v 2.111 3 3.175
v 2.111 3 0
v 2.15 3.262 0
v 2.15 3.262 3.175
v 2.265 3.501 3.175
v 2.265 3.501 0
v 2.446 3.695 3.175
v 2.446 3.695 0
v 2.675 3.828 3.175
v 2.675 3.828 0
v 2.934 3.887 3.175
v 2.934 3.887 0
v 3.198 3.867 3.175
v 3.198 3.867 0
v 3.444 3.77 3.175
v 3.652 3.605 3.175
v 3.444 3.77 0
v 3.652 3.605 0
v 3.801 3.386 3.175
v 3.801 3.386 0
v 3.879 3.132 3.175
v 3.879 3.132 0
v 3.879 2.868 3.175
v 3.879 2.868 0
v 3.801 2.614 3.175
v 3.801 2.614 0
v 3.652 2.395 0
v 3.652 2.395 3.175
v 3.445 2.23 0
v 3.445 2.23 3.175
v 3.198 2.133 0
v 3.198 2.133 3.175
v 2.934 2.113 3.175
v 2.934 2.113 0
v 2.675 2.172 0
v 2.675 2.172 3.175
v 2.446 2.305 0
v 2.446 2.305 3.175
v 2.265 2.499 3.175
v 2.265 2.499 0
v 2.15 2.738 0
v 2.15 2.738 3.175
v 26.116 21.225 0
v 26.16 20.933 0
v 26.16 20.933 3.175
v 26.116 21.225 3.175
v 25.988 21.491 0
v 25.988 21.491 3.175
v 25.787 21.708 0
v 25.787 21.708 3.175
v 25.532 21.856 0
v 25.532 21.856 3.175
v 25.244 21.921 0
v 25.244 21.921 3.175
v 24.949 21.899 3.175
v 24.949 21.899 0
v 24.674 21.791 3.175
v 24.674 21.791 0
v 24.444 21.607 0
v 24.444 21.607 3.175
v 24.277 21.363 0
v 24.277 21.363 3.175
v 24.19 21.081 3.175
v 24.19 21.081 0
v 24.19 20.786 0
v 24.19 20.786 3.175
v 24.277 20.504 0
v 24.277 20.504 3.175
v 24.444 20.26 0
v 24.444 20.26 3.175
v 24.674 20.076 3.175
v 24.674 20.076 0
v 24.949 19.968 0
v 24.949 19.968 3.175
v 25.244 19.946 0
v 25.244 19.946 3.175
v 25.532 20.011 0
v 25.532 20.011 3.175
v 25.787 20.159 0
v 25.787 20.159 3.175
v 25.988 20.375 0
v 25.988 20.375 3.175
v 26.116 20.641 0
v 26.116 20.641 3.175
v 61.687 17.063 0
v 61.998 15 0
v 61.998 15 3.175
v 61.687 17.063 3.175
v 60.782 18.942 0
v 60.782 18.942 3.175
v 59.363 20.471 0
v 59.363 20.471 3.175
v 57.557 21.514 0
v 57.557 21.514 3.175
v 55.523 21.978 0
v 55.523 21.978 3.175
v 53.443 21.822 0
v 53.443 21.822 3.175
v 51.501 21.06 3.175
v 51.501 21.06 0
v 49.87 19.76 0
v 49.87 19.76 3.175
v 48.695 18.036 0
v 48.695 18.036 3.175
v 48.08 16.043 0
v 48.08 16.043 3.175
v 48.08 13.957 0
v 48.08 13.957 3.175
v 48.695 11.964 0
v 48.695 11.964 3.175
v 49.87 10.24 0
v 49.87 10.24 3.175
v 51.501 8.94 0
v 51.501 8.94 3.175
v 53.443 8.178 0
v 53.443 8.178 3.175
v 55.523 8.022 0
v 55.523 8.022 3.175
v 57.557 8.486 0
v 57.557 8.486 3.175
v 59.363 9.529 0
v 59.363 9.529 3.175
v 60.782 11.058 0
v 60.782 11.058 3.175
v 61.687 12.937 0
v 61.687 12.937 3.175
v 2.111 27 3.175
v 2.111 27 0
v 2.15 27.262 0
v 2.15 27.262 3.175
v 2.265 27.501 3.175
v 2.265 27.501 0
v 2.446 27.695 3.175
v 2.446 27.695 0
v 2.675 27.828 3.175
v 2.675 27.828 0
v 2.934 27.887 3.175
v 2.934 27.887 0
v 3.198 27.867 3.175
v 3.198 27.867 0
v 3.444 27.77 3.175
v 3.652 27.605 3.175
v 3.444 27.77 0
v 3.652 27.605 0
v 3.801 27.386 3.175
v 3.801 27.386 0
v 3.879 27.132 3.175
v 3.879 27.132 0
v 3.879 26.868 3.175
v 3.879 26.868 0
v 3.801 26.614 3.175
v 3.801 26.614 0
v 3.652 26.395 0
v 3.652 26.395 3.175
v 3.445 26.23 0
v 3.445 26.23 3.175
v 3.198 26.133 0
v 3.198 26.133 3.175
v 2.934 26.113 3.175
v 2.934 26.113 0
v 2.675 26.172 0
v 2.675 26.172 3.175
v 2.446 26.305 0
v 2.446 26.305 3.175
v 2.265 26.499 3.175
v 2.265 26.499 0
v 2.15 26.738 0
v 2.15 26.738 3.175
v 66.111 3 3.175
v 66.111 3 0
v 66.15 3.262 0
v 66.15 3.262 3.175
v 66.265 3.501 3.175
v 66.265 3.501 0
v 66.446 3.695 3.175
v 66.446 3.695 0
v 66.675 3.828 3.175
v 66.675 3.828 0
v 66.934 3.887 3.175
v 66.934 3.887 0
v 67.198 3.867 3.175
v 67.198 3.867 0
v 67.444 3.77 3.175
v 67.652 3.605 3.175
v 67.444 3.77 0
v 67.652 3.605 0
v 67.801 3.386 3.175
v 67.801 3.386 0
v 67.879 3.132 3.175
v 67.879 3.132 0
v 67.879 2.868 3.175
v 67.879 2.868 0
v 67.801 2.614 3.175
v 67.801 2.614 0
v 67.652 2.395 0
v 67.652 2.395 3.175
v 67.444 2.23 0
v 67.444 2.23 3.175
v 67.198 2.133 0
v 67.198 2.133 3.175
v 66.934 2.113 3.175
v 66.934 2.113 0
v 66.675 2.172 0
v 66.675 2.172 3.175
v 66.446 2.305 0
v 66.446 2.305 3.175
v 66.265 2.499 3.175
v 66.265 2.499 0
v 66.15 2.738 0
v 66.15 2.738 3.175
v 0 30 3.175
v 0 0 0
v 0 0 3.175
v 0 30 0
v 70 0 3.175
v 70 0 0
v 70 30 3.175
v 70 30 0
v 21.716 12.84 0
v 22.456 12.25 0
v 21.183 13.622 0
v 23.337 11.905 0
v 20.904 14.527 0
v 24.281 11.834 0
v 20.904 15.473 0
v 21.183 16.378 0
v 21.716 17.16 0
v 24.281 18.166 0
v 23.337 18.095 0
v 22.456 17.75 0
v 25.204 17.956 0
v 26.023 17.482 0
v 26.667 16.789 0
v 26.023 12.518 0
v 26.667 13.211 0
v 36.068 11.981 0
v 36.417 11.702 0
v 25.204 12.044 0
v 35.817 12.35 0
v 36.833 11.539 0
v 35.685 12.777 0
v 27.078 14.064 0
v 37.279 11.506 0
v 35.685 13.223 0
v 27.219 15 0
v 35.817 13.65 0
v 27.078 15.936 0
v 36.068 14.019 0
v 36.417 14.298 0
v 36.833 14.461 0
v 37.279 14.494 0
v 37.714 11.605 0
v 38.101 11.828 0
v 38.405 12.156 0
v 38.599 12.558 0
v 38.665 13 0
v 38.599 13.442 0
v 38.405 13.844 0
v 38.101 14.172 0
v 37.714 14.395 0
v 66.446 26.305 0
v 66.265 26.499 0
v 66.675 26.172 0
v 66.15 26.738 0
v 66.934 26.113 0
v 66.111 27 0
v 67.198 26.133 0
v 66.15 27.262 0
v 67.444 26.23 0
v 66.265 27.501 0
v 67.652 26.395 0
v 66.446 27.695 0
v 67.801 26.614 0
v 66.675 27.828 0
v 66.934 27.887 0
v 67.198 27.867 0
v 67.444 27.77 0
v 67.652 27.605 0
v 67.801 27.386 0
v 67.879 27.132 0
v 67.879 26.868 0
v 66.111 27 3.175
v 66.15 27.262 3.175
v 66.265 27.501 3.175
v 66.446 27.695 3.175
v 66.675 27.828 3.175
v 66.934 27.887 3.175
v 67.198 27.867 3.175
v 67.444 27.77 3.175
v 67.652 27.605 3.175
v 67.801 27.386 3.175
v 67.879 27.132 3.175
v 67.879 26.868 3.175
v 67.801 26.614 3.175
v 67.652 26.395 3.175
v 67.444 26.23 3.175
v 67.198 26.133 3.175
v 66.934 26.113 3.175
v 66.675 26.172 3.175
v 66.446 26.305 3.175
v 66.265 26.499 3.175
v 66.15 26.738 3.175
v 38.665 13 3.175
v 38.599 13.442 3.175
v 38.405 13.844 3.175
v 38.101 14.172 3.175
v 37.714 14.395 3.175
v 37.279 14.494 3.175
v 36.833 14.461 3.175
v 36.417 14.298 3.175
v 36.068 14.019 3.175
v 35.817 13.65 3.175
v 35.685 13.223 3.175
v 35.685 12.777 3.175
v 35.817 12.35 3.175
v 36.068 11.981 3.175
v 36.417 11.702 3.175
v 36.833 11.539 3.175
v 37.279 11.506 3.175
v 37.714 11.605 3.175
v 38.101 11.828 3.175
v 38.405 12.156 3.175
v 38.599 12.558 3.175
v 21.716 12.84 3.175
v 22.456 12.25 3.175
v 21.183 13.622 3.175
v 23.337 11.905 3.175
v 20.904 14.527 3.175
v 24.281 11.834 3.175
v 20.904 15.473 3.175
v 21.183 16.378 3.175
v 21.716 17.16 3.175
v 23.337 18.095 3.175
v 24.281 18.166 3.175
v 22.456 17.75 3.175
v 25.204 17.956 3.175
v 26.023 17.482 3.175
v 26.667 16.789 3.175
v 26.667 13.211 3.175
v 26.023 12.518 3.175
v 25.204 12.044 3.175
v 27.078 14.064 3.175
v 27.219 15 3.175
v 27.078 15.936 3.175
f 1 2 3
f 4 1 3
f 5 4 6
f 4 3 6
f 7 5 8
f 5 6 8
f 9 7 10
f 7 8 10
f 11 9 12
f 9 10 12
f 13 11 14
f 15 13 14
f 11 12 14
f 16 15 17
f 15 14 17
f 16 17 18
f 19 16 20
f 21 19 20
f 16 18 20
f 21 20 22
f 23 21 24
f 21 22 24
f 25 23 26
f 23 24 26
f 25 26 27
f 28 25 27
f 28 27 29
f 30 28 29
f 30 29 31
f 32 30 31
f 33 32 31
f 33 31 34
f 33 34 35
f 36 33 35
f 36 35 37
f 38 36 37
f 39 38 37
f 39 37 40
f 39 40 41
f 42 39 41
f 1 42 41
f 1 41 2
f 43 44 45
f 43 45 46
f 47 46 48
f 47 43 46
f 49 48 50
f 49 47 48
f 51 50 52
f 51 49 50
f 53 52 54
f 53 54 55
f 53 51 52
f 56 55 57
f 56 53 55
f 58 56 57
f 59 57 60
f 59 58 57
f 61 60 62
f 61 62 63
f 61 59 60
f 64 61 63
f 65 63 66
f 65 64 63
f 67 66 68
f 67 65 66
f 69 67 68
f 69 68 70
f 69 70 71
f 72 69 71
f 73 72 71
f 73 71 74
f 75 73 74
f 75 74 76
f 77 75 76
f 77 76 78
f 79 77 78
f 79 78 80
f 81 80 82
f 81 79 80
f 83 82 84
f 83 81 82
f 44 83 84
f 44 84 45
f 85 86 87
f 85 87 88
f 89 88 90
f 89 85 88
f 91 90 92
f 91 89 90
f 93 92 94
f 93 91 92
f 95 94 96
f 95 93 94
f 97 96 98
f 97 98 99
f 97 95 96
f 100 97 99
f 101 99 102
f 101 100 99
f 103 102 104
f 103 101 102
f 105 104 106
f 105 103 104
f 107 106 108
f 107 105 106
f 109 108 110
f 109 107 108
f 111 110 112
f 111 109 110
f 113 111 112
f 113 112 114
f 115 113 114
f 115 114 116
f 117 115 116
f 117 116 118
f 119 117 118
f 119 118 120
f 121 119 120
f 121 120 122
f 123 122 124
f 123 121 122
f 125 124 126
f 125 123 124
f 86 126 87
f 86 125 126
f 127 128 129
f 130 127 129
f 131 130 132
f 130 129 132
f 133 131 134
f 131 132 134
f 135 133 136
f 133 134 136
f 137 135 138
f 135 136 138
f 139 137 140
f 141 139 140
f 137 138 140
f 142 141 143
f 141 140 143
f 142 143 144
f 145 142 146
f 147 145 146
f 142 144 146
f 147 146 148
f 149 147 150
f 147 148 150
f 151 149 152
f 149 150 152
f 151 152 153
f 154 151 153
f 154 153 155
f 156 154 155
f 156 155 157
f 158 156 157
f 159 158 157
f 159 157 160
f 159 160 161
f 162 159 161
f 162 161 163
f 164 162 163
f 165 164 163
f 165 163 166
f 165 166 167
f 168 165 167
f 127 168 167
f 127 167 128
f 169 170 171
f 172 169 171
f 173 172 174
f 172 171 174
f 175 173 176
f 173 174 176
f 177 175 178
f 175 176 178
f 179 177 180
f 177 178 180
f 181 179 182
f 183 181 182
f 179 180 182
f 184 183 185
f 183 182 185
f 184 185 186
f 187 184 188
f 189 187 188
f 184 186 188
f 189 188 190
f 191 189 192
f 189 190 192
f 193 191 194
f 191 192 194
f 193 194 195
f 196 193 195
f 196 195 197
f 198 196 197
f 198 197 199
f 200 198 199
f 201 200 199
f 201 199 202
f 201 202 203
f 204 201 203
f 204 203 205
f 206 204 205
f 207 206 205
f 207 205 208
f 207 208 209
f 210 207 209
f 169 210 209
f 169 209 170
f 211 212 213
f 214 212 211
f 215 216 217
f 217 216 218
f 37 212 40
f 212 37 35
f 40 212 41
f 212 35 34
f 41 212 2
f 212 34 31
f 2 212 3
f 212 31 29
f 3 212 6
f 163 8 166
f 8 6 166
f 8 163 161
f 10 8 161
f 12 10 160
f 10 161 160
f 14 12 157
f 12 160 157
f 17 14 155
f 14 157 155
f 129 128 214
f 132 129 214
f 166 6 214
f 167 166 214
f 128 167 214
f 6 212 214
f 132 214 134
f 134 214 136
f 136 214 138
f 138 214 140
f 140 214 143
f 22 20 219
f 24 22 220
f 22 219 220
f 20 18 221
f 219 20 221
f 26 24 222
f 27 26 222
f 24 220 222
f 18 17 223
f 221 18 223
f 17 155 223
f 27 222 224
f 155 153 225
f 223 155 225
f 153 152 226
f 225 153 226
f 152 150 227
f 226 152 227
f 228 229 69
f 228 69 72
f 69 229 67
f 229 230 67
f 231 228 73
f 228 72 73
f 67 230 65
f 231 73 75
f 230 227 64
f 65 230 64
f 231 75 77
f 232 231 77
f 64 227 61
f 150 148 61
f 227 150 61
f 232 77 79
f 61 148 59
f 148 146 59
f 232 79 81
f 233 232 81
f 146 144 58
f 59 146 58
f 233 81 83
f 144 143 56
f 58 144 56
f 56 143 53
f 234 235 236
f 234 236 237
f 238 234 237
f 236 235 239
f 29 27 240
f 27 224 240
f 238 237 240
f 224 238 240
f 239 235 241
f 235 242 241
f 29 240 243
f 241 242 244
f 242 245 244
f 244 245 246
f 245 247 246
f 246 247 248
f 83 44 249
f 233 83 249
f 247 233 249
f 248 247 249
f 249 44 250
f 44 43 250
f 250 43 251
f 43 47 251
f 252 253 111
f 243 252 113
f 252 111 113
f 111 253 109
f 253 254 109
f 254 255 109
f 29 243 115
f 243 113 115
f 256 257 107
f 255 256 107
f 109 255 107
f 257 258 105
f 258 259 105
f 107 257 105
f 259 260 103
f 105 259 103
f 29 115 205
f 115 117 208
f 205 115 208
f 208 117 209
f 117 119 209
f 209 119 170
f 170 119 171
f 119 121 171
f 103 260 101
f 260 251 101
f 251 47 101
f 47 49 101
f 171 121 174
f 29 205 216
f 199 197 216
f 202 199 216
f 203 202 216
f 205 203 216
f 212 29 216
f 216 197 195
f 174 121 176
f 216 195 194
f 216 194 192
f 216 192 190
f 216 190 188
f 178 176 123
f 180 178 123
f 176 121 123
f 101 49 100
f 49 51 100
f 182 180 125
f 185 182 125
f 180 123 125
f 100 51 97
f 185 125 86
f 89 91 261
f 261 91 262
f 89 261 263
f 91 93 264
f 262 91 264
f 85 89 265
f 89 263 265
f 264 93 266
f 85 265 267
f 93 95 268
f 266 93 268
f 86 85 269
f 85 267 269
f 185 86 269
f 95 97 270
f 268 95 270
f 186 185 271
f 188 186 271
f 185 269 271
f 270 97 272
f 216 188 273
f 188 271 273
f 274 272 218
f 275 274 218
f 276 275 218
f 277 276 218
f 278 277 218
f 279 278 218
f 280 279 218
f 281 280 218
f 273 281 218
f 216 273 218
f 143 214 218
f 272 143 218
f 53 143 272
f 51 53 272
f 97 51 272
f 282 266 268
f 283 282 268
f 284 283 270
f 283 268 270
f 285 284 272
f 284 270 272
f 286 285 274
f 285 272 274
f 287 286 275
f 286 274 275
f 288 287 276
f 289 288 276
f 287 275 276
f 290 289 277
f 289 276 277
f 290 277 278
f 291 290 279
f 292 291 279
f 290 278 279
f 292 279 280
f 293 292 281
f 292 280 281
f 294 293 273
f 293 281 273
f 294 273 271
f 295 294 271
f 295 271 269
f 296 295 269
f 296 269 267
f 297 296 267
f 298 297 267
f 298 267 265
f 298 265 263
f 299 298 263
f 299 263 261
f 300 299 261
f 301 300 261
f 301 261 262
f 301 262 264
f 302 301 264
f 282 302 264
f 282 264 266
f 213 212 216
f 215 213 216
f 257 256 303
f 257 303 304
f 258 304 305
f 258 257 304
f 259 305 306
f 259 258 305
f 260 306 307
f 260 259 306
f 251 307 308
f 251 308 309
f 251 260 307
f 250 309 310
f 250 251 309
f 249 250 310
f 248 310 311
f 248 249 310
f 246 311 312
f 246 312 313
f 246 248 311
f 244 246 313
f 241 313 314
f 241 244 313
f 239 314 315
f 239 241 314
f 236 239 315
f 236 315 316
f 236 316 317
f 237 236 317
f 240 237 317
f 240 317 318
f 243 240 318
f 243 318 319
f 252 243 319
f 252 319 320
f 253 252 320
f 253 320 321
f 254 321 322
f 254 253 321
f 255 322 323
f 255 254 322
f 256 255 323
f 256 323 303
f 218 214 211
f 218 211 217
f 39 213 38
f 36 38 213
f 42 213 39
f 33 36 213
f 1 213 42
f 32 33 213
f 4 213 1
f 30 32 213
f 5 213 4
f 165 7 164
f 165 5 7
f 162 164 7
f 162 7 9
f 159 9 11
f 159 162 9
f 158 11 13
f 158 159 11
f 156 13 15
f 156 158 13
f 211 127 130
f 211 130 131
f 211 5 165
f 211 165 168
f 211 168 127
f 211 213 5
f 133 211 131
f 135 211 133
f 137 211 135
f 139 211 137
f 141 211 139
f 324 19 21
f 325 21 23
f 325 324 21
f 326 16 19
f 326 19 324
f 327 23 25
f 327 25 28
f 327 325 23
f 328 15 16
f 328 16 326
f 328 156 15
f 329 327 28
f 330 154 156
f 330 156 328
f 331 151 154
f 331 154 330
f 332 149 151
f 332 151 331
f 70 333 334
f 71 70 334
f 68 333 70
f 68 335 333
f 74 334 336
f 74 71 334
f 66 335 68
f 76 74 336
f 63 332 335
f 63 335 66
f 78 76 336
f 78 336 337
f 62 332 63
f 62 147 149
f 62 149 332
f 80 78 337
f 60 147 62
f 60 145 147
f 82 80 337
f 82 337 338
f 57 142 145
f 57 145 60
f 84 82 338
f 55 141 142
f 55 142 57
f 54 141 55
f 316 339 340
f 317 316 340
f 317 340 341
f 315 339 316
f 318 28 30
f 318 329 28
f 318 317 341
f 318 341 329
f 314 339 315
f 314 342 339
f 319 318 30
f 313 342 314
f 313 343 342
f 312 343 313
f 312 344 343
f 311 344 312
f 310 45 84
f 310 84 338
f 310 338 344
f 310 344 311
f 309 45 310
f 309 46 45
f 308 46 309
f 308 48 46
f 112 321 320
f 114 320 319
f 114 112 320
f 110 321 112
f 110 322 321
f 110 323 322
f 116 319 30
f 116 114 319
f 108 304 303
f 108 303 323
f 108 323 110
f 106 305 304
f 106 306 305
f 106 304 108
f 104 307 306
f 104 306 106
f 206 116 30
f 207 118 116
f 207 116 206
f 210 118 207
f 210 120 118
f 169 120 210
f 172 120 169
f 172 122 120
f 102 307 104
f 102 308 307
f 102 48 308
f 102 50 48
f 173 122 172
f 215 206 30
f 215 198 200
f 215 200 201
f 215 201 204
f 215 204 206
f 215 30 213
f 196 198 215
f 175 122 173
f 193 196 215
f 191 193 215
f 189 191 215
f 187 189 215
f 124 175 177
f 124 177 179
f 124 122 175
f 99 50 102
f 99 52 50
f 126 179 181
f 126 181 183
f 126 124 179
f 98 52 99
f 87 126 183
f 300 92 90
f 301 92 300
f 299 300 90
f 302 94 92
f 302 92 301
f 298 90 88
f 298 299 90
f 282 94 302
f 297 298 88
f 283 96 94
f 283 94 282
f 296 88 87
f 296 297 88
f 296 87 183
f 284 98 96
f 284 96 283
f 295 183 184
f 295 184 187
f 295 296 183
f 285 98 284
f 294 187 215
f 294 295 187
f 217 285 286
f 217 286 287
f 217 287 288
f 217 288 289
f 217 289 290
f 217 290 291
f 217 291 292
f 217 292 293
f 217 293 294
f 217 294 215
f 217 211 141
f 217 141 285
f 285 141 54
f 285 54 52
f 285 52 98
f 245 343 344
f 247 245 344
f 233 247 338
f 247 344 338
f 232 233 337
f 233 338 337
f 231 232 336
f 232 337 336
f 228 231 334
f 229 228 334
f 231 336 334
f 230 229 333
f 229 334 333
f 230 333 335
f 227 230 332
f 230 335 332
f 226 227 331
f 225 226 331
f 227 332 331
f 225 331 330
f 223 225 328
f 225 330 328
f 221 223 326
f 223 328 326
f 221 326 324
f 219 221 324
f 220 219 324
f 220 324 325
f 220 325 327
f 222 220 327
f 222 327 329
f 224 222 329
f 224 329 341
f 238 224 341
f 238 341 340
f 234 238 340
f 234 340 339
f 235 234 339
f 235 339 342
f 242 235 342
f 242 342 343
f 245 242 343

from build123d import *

# Parameters (mm, degrees)
SKETCH1_W             = 70
SKETCH1_H             = 30
SKETCH1_R             = 6.9977
SKETCH1_R_2           = 1.4986
SKETCH1_R_3           = 0.9906
BOSS_EXTRUDE2_DEPTH   = 3.175
F_2_56_TAPPED_HOLE1_D = 1.778
SKETCH4_R             = 3.175
CUT_EXTRUDE1_DEPTH    = 77.223884872


with BuildPart() as part:
    # Sketch1 → Boss-Extrude2 (new body)
    with BuildSketch(Plane.XY):
        with Locations((35, 15)):
            Rectangle(SKETCH1_W, SKETCH1_H)
        with Locations((55, 15)):
            Circle(SKETCH1_R, mode=Mode.SUBTRACT)
        with Locations((37.166699296, 13)):
            Circle(SKETCH1_R_2, mode=Mode.SUBTRACT)
        with Locations((25.169778966, 20.933400182)):
            Circle(SKETCH1_R_3, mode=Mode.SUBTRACT)
    extrude(amount=BOSS_EXTRUDE2_DEPTH)

    # #2-56 Tapped Hole1 (through all)
    with Locations(Plane.XY.offset(3.175)):
        with Locations((67, 27), (67, 3), (3, 27), (3, 3)):
            Hole(F_2_56_TAPPED_HOLE1_D / 2)

    # Sketch4 → Cut-Extrude1 (cut, through all)
    with BuildSketch(Plane.XY.offset(3.175)):
        with Locations((24.0438, 15)):
            Circle(SKETCH4_R)
    extrude(amount=-CUT_EXTRUDE1_DEPTH, mode=Mode.SUBTRACT)


solid = part.part
